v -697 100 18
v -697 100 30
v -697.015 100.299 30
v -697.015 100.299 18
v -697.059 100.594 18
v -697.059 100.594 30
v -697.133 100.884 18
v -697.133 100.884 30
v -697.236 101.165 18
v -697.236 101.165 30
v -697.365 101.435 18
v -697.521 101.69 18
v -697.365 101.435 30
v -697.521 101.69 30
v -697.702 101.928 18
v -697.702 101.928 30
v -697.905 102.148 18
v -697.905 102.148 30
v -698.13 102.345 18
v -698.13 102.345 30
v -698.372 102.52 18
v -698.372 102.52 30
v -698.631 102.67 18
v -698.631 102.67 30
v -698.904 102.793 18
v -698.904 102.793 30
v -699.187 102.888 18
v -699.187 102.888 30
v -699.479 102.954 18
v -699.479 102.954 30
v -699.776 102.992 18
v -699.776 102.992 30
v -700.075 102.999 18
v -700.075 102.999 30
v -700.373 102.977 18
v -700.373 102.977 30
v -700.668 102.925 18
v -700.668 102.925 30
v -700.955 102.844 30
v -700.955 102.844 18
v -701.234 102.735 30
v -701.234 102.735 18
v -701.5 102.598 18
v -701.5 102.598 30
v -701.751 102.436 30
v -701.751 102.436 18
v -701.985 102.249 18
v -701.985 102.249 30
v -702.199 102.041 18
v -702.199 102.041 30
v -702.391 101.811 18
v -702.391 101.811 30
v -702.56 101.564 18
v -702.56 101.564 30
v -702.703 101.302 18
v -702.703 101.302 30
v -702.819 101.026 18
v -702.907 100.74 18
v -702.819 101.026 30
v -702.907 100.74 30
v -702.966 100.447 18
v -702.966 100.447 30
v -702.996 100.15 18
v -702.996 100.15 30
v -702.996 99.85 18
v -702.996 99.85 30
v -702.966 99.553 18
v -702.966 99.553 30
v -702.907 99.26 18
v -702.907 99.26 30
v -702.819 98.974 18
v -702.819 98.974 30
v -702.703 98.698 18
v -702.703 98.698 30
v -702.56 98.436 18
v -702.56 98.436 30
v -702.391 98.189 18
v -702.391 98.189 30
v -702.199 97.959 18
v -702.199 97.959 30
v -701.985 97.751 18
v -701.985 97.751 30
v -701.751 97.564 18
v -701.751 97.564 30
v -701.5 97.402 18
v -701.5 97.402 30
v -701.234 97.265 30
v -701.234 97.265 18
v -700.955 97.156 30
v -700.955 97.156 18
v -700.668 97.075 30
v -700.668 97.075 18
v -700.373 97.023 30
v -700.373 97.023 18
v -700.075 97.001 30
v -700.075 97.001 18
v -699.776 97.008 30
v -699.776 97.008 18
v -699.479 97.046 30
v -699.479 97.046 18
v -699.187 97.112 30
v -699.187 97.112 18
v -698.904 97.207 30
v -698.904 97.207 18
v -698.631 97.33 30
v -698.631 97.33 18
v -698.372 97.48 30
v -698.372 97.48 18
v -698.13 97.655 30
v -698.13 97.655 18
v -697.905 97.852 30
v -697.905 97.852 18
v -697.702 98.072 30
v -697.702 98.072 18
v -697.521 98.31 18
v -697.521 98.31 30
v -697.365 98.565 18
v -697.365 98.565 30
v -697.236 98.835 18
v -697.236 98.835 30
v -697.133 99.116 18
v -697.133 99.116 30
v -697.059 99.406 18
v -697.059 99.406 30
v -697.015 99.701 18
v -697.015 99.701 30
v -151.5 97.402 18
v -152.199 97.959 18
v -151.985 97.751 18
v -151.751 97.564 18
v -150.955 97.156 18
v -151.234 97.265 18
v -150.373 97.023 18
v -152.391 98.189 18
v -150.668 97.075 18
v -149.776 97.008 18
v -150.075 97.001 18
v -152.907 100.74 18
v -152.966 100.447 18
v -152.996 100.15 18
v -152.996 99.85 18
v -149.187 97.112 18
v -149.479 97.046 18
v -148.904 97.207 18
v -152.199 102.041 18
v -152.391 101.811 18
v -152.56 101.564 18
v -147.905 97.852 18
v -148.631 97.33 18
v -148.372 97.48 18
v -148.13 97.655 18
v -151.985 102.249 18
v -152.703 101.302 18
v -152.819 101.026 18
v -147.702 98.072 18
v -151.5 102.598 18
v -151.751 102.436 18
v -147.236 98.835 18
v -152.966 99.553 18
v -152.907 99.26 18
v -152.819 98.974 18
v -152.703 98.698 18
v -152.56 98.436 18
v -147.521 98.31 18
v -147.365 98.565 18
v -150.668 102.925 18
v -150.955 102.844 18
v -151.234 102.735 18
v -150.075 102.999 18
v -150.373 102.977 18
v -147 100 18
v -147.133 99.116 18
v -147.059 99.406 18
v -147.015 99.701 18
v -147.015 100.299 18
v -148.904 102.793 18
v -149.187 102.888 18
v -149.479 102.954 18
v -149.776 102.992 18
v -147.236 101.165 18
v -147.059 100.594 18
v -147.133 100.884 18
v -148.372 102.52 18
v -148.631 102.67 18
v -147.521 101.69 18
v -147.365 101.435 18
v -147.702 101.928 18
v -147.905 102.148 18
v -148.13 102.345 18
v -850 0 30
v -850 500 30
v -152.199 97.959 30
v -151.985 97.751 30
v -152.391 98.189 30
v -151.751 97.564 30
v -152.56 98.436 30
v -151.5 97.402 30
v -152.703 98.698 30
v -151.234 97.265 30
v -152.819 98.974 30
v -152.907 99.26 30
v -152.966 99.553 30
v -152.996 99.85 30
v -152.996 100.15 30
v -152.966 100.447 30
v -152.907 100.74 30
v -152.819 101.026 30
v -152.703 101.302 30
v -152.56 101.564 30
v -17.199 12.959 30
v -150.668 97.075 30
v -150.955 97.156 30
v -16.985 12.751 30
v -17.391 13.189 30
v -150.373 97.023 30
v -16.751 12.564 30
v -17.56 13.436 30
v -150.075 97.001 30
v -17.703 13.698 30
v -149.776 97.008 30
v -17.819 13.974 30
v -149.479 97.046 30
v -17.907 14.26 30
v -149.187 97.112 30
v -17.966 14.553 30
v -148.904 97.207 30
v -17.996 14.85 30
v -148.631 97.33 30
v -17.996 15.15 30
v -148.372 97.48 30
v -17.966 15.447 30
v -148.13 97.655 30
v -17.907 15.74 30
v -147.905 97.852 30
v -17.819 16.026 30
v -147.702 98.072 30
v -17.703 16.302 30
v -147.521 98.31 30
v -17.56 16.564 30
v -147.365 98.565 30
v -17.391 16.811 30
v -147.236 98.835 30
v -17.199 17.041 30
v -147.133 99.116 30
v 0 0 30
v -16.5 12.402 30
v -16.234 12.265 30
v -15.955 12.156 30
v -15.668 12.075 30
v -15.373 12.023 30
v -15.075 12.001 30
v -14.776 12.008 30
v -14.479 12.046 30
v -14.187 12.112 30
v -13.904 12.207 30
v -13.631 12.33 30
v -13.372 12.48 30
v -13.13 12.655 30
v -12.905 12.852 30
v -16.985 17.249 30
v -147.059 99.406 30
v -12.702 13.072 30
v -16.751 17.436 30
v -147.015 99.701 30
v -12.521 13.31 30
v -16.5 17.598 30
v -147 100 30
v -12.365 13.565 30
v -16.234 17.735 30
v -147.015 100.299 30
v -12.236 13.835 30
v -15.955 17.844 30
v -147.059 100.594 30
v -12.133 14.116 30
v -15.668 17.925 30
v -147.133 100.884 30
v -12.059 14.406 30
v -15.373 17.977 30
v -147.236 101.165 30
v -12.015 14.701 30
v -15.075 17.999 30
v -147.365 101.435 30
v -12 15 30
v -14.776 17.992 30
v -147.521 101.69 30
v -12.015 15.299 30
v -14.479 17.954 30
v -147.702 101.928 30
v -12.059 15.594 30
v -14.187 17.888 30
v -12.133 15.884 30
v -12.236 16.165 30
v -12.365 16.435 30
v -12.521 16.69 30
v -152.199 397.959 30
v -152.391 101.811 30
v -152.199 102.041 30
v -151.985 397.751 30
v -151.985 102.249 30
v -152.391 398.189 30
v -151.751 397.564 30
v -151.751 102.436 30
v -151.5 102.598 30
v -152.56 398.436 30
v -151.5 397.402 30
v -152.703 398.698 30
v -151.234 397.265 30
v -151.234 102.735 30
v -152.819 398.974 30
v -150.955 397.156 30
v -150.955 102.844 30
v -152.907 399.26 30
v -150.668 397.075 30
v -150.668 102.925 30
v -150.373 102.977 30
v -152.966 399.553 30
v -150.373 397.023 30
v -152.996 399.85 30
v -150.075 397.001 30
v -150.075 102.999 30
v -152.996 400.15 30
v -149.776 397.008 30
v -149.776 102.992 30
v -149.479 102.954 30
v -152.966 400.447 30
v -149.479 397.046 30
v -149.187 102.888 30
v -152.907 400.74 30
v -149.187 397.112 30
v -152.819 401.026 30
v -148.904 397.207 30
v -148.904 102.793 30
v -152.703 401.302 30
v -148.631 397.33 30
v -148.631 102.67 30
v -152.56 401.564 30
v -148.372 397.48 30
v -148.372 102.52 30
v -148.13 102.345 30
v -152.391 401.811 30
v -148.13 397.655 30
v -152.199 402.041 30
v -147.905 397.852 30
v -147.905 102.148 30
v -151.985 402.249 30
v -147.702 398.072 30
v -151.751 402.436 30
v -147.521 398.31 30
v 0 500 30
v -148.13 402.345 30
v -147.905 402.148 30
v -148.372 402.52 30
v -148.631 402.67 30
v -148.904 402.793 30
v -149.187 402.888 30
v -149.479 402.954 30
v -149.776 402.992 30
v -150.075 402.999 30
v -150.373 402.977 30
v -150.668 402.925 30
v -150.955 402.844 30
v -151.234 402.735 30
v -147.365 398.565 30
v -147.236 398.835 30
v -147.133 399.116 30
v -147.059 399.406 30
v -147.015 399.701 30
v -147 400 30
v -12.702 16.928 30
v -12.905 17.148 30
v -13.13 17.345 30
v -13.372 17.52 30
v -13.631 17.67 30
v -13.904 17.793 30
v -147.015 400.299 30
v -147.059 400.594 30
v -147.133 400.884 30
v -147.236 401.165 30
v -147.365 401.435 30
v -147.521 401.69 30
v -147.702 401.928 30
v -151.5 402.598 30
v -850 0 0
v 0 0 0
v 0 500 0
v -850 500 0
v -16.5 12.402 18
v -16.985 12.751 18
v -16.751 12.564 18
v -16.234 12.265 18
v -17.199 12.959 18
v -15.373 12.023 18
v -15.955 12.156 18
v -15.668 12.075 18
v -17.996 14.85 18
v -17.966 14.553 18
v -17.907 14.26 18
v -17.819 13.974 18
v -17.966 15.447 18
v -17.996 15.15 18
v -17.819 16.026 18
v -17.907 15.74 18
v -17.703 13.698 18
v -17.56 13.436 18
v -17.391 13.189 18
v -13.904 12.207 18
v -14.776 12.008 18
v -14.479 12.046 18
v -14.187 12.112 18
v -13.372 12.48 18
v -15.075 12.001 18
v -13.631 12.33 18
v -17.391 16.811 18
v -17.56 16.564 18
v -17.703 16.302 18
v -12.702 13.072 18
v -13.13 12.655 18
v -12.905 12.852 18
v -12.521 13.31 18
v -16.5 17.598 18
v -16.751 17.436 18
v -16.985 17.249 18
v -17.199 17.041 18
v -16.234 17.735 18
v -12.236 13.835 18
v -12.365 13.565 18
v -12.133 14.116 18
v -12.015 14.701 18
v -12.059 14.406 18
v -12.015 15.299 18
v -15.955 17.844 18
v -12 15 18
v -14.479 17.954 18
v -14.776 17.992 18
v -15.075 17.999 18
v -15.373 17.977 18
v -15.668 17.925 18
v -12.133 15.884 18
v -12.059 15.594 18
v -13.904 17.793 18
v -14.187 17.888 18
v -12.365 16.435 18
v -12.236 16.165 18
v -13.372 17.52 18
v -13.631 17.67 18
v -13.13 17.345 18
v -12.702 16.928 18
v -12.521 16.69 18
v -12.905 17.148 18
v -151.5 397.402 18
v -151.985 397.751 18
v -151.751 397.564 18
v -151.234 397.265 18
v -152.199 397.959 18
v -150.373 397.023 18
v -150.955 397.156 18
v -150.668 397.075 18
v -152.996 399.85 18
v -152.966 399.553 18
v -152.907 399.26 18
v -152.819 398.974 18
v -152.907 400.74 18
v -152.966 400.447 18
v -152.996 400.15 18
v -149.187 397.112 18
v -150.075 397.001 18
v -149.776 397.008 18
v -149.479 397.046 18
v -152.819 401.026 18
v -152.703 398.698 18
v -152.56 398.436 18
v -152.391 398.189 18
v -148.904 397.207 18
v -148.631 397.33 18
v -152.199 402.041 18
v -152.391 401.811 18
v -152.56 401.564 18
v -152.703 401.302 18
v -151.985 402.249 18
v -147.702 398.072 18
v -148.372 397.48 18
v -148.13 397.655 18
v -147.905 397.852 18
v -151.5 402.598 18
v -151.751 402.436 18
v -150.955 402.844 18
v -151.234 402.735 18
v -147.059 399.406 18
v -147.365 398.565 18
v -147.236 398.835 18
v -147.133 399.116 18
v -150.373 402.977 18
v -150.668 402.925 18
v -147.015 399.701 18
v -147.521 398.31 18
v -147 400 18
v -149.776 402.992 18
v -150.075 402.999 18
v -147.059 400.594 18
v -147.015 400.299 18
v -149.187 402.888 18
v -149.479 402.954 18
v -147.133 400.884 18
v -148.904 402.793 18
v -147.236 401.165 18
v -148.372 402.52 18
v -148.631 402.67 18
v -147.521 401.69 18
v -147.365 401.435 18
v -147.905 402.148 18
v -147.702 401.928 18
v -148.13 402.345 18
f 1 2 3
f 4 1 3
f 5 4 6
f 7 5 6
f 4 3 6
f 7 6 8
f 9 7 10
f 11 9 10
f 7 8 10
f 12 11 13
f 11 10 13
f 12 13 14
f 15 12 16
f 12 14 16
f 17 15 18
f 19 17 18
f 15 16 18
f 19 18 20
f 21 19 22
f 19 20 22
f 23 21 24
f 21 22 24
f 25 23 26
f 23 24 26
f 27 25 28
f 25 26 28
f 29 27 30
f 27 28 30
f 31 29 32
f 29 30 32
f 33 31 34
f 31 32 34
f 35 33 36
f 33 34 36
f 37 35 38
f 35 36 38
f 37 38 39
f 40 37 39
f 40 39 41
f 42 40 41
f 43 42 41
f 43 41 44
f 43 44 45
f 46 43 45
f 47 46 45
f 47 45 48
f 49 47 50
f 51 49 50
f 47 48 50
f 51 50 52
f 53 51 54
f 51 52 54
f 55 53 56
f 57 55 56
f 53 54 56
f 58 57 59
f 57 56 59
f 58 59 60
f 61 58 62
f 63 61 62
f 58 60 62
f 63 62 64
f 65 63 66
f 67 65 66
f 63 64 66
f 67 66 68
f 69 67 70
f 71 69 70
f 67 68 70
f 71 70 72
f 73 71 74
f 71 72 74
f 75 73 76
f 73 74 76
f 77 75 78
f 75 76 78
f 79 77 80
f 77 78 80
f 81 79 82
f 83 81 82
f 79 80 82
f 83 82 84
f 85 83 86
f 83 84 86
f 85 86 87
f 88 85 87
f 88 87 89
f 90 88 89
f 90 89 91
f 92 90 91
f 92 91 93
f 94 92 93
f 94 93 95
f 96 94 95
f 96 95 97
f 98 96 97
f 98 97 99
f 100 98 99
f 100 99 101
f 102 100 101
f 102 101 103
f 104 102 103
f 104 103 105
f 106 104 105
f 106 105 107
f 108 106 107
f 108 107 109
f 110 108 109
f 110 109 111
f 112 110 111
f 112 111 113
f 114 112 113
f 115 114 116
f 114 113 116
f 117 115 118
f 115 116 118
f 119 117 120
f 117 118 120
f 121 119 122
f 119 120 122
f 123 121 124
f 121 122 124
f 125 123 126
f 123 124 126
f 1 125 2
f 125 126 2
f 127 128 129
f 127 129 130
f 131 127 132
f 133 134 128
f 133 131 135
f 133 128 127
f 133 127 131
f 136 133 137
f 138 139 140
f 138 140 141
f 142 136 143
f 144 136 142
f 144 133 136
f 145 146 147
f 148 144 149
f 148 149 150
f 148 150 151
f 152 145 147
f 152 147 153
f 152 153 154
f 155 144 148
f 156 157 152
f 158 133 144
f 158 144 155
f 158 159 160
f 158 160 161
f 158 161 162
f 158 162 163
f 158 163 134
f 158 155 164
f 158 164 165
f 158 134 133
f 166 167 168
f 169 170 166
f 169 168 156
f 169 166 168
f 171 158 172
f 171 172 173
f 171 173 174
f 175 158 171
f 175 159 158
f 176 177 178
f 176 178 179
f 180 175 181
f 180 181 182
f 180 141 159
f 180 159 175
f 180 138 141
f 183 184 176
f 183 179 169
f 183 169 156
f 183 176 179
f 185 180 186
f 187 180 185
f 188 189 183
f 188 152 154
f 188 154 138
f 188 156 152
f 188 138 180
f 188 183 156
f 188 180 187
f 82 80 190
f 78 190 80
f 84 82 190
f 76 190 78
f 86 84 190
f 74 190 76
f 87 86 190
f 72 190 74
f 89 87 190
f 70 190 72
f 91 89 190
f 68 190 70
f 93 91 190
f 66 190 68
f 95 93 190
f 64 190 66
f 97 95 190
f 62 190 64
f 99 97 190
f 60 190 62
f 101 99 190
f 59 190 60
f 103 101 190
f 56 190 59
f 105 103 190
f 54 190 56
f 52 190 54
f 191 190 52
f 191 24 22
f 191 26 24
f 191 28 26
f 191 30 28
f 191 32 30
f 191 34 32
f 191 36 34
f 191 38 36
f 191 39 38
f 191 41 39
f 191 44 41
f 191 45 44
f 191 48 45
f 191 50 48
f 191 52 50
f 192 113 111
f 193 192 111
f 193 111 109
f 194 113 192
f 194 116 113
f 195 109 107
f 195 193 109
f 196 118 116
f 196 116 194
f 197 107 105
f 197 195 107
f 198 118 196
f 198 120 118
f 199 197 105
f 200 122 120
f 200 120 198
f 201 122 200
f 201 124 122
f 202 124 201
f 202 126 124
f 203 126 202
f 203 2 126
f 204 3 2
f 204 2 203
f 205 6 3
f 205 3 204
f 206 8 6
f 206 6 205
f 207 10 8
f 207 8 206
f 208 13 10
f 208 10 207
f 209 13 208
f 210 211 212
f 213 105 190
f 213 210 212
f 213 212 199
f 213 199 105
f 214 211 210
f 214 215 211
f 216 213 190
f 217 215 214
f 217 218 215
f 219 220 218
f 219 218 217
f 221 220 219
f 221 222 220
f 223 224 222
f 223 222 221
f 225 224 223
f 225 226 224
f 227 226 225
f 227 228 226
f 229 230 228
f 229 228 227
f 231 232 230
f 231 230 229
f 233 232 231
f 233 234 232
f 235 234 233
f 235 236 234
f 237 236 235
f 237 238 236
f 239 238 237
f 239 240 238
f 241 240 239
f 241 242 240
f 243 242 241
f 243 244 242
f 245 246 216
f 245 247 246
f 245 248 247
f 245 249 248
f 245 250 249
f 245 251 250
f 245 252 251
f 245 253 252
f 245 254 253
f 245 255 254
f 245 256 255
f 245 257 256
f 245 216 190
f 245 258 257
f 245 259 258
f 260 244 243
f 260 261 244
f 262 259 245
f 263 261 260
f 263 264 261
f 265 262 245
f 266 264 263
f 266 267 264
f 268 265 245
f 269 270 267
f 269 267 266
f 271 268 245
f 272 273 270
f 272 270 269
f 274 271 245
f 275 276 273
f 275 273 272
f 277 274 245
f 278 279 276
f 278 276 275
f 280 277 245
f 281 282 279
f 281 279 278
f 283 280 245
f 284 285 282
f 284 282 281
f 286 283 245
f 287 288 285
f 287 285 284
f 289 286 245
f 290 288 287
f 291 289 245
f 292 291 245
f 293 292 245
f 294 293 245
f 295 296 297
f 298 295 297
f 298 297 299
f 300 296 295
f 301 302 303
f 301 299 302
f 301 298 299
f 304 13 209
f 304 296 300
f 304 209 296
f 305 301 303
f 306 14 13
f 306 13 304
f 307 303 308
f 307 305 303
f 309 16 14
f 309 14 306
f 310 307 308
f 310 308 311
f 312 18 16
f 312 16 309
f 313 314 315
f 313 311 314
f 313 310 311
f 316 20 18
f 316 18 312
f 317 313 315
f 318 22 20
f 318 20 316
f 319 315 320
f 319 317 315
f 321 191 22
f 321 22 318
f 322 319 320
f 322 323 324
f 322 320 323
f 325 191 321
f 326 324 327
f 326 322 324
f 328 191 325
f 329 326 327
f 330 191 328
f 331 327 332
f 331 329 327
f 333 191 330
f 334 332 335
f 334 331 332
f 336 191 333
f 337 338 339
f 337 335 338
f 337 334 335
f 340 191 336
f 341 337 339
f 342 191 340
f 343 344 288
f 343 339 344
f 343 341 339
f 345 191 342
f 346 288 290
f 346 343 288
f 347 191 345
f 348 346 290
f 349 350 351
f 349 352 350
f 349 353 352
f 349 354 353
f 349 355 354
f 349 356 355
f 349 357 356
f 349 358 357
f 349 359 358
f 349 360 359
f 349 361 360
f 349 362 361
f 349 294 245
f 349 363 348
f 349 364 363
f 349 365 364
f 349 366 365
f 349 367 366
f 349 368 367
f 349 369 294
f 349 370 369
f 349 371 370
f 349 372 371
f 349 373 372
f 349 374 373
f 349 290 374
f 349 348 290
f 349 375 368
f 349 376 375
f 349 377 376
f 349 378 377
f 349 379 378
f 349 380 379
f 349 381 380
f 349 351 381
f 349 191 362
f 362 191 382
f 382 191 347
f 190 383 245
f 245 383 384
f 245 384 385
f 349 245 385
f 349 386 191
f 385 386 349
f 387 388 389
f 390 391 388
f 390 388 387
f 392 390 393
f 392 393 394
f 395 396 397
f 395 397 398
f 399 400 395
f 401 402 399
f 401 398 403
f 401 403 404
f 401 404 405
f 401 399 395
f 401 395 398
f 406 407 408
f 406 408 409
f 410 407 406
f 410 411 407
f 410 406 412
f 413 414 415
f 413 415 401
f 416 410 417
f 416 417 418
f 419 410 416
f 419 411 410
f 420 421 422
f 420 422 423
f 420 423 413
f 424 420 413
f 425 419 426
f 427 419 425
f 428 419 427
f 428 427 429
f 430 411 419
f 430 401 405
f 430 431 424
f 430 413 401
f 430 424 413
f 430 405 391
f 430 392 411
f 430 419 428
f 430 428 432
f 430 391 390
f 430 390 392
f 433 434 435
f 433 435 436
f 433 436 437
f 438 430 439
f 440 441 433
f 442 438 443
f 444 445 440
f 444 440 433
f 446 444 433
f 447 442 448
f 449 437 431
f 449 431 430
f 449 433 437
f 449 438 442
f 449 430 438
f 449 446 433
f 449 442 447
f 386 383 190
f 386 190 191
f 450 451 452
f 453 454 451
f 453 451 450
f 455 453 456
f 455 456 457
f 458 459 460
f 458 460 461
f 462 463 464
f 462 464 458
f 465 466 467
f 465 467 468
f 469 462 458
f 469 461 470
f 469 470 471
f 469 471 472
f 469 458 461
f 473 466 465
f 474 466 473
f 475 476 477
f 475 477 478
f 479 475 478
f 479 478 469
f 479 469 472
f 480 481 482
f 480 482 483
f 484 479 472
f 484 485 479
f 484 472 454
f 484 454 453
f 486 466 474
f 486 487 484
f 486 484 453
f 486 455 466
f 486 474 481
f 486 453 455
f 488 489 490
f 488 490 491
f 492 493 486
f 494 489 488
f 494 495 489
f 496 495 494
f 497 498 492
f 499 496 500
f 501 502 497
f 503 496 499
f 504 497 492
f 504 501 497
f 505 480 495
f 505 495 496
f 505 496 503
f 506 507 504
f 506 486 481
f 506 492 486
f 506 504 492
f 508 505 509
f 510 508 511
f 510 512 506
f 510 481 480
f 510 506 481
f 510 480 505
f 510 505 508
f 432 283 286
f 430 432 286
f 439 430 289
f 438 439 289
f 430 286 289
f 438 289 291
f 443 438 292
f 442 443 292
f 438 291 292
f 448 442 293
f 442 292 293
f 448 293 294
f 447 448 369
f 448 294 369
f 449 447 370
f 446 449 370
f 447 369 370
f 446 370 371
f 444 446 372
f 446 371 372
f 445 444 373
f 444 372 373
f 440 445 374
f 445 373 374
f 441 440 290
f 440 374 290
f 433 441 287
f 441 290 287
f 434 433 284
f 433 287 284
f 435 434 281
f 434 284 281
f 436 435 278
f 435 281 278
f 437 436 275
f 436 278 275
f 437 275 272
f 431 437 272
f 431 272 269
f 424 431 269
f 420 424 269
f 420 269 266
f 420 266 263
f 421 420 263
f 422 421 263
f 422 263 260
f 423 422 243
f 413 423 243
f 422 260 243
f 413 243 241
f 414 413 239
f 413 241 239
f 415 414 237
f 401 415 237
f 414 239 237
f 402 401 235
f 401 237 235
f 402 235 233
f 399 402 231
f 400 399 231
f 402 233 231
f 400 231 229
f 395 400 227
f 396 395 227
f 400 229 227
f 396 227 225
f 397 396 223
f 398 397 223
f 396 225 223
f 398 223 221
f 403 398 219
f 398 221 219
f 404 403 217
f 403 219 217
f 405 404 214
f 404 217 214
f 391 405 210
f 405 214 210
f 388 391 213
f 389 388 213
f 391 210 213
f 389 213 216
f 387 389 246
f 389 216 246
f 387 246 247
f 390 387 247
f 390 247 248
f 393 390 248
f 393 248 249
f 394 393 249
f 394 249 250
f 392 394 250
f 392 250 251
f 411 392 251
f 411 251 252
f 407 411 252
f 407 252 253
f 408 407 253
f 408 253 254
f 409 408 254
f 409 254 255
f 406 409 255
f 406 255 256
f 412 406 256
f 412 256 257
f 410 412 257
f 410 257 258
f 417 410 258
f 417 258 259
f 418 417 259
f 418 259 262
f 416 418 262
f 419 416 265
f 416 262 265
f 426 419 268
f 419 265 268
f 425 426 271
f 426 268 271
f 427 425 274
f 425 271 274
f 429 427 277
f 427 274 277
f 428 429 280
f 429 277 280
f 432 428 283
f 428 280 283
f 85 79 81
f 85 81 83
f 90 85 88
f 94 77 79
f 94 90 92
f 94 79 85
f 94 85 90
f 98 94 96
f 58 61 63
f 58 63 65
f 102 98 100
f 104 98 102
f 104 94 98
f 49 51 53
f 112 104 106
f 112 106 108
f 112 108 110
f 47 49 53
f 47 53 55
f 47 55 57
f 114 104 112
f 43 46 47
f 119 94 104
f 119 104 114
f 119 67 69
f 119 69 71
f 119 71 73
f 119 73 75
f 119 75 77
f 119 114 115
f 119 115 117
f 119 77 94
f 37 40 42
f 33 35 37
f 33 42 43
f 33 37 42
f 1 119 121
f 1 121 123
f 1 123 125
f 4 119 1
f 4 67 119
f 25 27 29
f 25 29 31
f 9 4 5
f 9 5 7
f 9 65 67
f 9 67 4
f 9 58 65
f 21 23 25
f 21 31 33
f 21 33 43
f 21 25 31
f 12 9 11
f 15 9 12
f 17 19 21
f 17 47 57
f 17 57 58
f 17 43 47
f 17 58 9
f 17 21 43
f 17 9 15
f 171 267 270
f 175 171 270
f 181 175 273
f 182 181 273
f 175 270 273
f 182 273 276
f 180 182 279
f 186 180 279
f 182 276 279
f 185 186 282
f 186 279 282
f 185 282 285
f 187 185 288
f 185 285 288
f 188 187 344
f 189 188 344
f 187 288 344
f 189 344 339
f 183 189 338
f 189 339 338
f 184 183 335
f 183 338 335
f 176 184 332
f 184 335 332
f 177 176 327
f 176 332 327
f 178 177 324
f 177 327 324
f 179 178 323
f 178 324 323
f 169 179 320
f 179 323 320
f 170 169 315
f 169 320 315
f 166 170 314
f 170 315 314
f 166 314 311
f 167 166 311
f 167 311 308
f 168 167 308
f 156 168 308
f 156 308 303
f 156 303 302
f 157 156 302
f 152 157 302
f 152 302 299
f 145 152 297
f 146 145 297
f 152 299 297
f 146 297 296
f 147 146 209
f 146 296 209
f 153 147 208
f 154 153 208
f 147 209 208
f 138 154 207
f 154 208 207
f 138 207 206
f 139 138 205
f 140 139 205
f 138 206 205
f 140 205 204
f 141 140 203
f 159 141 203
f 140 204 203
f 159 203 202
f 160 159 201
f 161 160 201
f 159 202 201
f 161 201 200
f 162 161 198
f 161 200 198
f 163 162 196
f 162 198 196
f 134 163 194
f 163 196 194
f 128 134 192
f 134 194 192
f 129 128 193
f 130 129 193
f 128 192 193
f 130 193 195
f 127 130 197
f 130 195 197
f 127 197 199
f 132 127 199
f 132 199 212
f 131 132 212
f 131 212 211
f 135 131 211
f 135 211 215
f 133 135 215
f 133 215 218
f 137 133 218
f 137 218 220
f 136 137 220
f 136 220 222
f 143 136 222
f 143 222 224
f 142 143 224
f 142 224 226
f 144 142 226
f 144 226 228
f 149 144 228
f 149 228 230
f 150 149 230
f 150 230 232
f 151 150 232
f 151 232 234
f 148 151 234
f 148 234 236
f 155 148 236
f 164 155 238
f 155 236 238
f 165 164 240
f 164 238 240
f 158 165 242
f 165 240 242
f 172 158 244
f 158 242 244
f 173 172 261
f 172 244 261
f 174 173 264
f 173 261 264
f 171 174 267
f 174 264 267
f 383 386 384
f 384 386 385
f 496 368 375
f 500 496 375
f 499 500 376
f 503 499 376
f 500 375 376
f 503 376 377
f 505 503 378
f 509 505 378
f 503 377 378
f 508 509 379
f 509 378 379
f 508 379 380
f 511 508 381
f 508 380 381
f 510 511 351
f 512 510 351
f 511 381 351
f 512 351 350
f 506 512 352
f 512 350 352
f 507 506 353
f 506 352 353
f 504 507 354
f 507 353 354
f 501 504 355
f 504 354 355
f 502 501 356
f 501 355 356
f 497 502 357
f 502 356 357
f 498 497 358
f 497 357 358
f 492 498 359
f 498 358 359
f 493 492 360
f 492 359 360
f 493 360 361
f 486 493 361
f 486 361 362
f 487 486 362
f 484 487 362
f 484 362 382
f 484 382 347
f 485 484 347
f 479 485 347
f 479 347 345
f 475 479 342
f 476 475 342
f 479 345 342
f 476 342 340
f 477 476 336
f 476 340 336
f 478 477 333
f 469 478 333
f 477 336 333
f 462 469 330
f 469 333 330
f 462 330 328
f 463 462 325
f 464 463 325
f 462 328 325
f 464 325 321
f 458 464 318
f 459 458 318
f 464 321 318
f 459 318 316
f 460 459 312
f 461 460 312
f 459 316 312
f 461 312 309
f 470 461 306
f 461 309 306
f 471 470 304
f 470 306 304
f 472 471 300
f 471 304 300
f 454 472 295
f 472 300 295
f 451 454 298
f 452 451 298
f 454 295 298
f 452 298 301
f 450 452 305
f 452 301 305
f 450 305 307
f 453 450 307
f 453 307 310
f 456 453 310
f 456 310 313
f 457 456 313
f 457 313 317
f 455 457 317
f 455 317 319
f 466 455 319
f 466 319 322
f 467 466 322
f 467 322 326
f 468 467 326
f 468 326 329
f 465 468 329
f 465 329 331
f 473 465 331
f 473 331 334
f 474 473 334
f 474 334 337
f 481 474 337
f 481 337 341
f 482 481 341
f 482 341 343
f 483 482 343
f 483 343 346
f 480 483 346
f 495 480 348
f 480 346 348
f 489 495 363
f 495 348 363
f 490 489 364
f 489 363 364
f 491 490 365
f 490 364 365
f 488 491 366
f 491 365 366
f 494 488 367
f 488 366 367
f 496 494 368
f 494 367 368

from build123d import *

# Parameters (mm, degrees)
F0_W     = 850
F0_H     = 500
F1_DEPTH = 30
F2_R     = 3
F3_DEPTH = 12
F4_R     = 3
F5_DEPTH = 12
F6_R     = 3
F7_DEPTH = 12
F8_R     = 3
F9_DEPTH = 12


with BuildPart() as f1:
    # F0 (on Top) → F1 (new body)
    with BuildSketch(Plane.XY):
        with Locations((-425, 250)):
            Rectangle(F0_W, F0_H)
    extrude(amount=F1_DEPTH)

    # F2 (on face) → F3 (cut)
    with BuildSketch(Plane.XY.offset(30)):
        with Locations((-150, 100)):
            Circle(F2_R)
    extrude(amount=-F3_DEPTH, mode=Mode.SUBTRACT)

    # F4 (on face) → F5 (cut)
    with BuildSketch(Plane.XY.offset(30)):
        with Locations((-150, 400)):
            Circle(F4_R)
    extrude(amount=-F5_DEPTH, mode=Mode.SUBTRACT)

    # F6 (on face) → F7 (cut)
    with BuildSketch(Plane.XY.offset(30)):
        with Locations((-700, 100)):
            Circle(F6_R)
    extrude(amount=-F7_DEPTH, mode=Mode.SUBTRACT)

    # F8 (on face) → F9 (cut)
    with BuildSketch(Plane.XY.offset(30)):
        with Locations((-15, 15)):
            Circle(F8_R)
    extrude(amount=-F9_DEPTH, mode=Mode.SUBTRACT)


solid = f1.part
